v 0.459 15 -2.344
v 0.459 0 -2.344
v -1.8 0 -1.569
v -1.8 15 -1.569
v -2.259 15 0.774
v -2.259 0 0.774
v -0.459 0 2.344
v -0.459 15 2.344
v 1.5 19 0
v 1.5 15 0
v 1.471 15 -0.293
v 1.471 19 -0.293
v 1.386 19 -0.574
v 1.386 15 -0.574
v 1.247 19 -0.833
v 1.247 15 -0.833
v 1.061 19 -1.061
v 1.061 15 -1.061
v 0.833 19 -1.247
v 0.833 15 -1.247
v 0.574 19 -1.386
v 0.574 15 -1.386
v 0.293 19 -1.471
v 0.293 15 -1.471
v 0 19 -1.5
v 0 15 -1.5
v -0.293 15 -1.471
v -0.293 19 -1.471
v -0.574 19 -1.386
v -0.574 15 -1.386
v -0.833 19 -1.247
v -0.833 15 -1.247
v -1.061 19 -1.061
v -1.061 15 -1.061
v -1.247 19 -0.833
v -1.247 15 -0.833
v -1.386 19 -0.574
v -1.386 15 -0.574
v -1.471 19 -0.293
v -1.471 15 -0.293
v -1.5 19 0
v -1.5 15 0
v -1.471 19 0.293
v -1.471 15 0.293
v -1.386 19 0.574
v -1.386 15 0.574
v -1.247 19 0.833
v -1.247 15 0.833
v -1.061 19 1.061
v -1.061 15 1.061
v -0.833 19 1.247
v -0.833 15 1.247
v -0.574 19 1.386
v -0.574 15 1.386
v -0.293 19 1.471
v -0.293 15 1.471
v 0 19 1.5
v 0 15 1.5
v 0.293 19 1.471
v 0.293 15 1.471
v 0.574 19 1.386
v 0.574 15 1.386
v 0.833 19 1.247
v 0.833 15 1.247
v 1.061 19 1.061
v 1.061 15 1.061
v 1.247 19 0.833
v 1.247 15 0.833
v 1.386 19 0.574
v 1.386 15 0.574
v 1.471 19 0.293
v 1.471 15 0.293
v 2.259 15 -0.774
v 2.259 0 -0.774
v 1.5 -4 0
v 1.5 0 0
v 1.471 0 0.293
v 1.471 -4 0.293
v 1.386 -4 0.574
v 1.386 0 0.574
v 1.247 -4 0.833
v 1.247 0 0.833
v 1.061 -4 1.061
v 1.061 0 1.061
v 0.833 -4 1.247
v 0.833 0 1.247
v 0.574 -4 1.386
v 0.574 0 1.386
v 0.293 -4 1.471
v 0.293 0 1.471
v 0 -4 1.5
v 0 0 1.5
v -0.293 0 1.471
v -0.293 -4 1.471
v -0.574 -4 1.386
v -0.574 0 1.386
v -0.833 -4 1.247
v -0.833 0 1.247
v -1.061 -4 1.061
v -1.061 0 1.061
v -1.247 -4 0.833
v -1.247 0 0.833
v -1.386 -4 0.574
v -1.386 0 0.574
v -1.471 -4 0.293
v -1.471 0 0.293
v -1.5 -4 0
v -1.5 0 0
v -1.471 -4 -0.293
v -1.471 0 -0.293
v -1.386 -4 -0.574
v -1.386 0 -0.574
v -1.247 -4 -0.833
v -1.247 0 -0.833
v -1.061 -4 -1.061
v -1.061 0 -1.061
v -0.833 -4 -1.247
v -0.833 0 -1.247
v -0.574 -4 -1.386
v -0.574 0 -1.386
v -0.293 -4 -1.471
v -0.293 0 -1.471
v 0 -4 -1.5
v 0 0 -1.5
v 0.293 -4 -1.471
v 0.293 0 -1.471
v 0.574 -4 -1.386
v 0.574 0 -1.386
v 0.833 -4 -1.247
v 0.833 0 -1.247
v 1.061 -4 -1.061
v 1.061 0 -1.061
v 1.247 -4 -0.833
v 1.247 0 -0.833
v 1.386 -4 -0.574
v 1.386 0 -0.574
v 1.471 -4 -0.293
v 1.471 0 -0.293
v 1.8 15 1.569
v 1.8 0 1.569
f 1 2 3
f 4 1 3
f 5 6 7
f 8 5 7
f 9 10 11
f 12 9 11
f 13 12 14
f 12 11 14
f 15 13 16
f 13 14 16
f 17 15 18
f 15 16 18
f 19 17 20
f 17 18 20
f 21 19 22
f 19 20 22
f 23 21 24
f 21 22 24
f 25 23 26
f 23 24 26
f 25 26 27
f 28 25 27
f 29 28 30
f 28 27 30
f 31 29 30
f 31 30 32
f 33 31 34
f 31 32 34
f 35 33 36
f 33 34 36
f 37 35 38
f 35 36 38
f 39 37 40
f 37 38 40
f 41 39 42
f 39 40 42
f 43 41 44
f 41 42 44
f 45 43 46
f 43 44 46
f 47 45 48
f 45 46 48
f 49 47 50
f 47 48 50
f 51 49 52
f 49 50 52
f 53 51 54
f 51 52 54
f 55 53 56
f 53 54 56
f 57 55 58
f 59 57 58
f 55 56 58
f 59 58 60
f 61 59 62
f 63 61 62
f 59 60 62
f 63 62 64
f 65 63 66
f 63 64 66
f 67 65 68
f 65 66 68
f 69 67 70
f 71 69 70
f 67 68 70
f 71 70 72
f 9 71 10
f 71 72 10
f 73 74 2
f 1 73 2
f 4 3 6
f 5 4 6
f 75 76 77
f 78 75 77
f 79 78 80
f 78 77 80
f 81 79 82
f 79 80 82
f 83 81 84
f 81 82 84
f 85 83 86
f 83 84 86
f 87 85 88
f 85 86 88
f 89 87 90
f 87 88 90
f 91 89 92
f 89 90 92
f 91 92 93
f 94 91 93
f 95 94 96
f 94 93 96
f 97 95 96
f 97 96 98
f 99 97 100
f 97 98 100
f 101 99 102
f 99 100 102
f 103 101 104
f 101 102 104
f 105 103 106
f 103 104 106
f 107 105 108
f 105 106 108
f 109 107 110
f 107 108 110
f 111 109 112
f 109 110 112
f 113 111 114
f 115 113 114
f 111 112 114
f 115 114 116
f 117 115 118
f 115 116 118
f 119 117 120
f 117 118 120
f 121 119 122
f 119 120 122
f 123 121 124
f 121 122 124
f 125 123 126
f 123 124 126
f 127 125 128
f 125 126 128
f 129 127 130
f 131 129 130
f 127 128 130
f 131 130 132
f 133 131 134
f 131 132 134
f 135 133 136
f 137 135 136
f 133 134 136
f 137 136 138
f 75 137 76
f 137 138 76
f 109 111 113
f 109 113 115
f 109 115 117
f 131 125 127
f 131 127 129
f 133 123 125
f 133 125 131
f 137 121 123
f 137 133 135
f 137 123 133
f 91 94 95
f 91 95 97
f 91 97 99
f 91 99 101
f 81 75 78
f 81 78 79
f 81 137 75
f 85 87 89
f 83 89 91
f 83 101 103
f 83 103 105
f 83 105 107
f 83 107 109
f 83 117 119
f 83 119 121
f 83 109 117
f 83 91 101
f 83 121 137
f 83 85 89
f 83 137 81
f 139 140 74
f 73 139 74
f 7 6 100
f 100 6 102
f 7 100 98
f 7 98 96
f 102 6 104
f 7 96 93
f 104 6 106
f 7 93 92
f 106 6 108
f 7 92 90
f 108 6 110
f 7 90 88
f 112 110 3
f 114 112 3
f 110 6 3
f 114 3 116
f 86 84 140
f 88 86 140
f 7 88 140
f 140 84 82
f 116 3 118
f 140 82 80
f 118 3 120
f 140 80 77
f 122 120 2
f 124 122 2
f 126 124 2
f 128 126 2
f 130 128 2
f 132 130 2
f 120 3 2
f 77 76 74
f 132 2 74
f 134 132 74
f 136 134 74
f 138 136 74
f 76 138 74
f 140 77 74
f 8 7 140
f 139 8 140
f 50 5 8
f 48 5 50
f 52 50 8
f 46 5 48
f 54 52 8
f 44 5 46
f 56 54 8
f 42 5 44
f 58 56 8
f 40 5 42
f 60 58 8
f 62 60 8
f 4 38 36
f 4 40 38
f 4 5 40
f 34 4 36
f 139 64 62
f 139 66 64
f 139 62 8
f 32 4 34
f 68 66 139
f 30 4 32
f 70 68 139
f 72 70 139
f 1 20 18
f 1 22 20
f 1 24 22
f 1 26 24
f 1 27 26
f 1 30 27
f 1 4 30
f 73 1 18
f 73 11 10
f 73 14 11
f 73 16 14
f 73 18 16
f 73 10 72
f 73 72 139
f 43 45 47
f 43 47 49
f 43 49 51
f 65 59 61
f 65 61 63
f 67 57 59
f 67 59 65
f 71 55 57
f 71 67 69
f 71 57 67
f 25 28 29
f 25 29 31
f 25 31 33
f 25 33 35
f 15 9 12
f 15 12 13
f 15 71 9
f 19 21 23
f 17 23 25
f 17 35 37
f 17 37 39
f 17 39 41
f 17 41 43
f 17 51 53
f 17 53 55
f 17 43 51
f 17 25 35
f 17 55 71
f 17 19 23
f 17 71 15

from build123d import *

# Parameters (mm, degrees)
BOSS_EXTRUDE1_DEPTH = 15
SKETCH2_R           = 1.5
BOSS_EXTRUDE2_DEPTH = 4
SKETCH3_R           = 1.5
BOSS_EXTRUDE3_DEPTH = 4


with BuildPart() as part:
    # Sketch1 → Boss-Extrude1 (new body)
    with BuildSketch(Plane(origin=(0, 0, 0), x_dir=(1, 0, 0), z_dir=(0, 1, 0))):
        Polygon((1.800179217, -1.569235172), (2.259087132, 0.774383347), (0.458907915, 2.343618519), (-1.800179217, 1.569235172), (-2.259087132, -0.774383347), (-0.458907915, -2.343618519), align=None)
    extrude(amount=BOSS_EXTRUDE1_DEPTH)

    # Sketch2 → Boss-Extrude2 (add)
    with BuildSketch(Plane(origin=(0, 15, 0), x_dir=(1, 0, 0), z_dir=(0, 1, 0))):
        Circle(SKETCH2_R)
    extrude(amount=BOSS_EXTRUDE2_DEPTH)

    # Sketch3 → Boss-Extrude3 (add)
    with BuildSketch(Plane.XZ):
        Circle(SKETCH3_R)
    extrude(amount=BOSS_EXTRUDE3_DEPTH)


solid = part.part
